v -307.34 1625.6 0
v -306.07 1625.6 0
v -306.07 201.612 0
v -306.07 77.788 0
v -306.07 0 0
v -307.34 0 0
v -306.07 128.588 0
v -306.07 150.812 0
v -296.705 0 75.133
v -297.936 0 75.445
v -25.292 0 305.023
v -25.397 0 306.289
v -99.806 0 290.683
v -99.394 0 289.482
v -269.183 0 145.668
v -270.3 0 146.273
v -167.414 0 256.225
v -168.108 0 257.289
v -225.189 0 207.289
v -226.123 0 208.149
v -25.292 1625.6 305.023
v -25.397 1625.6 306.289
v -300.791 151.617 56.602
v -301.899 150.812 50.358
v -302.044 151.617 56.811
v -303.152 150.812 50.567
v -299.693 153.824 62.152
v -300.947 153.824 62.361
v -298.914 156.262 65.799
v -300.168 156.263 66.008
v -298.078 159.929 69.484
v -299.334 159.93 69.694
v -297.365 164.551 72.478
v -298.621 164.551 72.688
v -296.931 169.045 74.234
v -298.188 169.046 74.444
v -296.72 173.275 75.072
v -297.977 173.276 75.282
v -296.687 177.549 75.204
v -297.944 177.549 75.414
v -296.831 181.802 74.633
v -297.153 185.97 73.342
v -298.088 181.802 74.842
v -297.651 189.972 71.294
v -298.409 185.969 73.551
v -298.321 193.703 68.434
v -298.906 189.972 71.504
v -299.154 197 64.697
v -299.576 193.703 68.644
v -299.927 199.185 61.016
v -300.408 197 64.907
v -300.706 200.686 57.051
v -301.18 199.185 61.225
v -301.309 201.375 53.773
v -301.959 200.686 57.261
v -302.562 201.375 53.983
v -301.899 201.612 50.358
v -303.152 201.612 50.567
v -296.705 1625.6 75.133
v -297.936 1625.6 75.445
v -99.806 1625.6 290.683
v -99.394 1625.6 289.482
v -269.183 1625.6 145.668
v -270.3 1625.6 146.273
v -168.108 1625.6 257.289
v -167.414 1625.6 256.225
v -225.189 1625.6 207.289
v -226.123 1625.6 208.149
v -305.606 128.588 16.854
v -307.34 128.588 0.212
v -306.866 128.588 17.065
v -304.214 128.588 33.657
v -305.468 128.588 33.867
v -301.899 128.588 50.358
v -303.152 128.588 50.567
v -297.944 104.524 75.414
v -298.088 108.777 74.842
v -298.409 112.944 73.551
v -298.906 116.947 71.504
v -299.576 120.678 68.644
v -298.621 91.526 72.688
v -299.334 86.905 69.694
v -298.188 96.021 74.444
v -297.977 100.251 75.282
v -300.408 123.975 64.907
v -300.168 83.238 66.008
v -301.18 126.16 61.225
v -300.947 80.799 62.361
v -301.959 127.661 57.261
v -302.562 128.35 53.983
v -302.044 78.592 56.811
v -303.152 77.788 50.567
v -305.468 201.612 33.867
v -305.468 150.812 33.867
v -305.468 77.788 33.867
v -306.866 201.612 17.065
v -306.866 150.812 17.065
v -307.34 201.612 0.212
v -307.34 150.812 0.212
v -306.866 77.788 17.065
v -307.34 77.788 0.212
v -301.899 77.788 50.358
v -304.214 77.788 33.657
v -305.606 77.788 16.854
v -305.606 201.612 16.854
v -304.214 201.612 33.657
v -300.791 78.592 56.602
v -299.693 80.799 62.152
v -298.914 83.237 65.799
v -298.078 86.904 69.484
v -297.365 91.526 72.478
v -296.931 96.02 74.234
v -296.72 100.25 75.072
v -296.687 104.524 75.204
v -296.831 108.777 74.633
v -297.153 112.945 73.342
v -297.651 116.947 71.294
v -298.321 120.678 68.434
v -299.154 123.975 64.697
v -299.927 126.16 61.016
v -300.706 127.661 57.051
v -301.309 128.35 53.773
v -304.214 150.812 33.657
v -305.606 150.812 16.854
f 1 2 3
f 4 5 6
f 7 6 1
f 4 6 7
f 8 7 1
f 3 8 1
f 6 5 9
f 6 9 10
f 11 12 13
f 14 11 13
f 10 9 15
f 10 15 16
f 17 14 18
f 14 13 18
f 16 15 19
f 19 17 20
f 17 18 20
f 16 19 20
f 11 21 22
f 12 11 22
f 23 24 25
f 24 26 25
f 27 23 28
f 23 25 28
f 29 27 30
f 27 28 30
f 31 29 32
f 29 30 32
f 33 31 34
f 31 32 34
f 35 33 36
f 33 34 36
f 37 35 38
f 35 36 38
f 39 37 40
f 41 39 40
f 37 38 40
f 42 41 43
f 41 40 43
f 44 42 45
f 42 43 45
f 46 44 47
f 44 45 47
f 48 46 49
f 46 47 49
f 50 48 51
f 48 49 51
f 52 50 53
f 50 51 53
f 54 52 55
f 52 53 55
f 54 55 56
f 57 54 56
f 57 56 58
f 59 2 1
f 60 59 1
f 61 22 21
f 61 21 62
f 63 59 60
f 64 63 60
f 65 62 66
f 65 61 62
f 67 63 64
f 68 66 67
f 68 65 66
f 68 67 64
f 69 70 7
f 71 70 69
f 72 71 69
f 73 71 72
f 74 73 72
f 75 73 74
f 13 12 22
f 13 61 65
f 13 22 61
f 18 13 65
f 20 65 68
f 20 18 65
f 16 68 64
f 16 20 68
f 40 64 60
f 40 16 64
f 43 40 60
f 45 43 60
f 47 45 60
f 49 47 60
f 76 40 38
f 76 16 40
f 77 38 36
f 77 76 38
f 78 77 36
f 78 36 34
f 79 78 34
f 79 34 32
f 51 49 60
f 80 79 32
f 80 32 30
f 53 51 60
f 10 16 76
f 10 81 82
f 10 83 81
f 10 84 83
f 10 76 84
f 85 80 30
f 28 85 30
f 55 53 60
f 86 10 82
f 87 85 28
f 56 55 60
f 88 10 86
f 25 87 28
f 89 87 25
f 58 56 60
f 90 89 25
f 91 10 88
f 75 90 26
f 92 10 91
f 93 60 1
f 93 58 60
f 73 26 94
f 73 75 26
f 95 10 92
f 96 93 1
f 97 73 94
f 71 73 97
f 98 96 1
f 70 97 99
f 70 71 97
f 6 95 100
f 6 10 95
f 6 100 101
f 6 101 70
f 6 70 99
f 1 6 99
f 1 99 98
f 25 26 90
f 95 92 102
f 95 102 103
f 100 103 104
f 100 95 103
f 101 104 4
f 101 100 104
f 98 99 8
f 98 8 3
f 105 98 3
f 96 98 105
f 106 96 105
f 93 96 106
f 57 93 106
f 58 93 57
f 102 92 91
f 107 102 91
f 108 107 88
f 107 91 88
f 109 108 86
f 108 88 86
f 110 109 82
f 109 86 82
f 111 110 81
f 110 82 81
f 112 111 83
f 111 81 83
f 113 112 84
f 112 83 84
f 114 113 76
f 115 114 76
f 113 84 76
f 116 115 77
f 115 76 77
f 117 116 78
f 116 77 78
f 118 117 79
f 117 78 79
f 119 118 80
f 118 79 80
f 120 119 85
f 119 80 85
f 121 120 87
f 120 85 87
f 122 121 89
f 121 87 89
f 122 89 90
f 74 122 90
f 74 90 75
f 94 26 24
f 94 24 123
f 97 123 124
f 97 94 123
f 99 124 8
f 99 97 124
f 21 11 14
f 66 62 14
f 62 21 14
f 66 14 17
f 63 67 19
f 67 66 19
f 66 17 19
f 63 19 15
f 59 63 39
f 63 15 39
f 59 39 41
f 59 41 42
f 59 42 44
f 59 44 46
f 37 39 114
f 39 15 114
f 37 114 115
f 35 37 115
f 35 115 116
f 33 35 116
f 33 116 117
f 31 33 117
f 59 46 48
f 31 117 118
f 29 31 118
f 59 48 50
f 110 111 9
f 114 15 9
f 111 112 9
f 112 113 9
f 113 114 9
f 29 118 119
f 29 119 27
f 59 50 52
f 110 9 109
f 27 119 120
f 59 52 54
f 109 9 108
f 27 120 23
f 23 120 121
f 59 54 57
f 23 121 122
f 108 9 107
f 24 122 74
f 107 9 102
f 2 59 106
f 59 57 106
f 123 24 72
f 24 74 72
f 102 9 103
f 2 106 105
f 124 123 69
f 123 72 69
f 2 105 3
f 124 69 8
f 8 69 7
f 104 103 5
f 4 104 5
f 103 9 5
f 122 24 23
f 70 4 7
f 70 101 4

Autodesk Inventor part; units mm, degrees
ref_plane "YZ Plane" through (0, 0, 0) normal (1, 0, 0) x (0, 1, 0)
ref_plane "XZ Plane" through (0, 0, 0) normal (0, 1, 0) x (-1, 0, 0)
sketch "Sketch1" plane through (0, 0, 0) normal (0, 1, 0) x (-1, 0, 0)
  arc A0 (307.34, 0) -> (25.3968, 306.2889) centre (0, 0) ccw
  line L0 (0, 0) -> (25.3968, 306.2889) construction
  line L1 (0, 0) -> (307.34, 0) construction
  arc A1 (306.07, 0) -> (25.2919, 305.0232) centre (0, 0) ccw
  line L2 (0, 0) -> (25.2919, 305.0232) construction
  line L3 (0, 0) -> (306.07, 0) construction
  line L4 (306.07, 0) -> (307.34, 0)
  line L5 (25.2919, 305.0232) -> (25.3968, 306.2889)
  dimension "d0" = 307.34
  dimension "d1" = 85.26
  dimension "d2" = 306.07
  dimension "d3" = 85.26
extrude "Extrusion1" add sketch "Sketch1" along normal blind 1625.6
sketch "Sketch2" plane through (0, 0, 0) normal (0, 1, 0) x (-1, 0, 0)
  arc A0 (307.34, 0) -> (303.1515, 50.567) centre (0, 0) ccw
  line L0 (0, 0) -> (303.1515, 50.567) construction
  line L1 (0, 0) -> (307.34, 0) construction
  arc A1 (307.34, 0) -> (290.6829, 99.8065) centre (0, 0) ccw
  line L2 (0, 0) -> (290.6829, 99.8065) construction
  line L3 (0, 0) -> (307.34, 0) construction
  arc A2 (123.4855, 281.4413) -> (25.3968, 306.2889) centre (0, 0) ccw
  line L4 (0, 0) -> (123.4855, 281.4413) construction
  line L5 (0, 0) -> (25.3968, 306.2889) construction
  dimension "d6" = 307.34
  dimension "d7" = 9.47
  dimension "d14" = 18.95
  dimension "d15" = 18.95
ref_plane "Work Plane1" through (-303.1515, 0, 50.567) normal (-0.9863719, 0, 0.1645312) x (0, -1, 0)
sketch "Sketch3" plane through (-303.1515, 0, 50.567) normal (-0.9863719, 0, 0.1645312) x (0, -1, 0)
  circle A0 centre (-103.1875, 0) radius 25.4
  line L0 (0, 297.9362) -> (0, -50.567) projected
  line L1 (0, -50.3581) -> (-1625.6, -50.3581) projected
  line L2 (-128.5875, 0) -> (-77.7875, 0)
  line L3 (-77.7875, 0) -> (-77.7875, -50.3581)
  line L4 (-77.7875, -50.3581) -> (-128.5875, -50.3581)
  line L5 (-128.5875, -50.3581) -> (-128.5875, 0)
  circle A1 centre (-176.2125, 0) radius 25.4
  line L6 (-201.6125, 0) -> (-150.8125, 0)
  line L7 (-150.8125, 0) -> (-150.8125, -50.3581)
  line L8 (-150.8125, -50.3581) -> (-201.6125, -50.3581)
  line L9 (-201.6125, -50.3581) -> (-201.6125, 0)
  point P0 (0, 0)
  dimension "d8" = 50.8
  dimension "d10" = 50.8
  dimension "d9" = 103.1875
  dimension "d11" = 176.2125
extrude "Extrusion2" cut sketch "Sketch3" against normal blind 25.4
properties part number "EDM Middle Shield Part 4"
